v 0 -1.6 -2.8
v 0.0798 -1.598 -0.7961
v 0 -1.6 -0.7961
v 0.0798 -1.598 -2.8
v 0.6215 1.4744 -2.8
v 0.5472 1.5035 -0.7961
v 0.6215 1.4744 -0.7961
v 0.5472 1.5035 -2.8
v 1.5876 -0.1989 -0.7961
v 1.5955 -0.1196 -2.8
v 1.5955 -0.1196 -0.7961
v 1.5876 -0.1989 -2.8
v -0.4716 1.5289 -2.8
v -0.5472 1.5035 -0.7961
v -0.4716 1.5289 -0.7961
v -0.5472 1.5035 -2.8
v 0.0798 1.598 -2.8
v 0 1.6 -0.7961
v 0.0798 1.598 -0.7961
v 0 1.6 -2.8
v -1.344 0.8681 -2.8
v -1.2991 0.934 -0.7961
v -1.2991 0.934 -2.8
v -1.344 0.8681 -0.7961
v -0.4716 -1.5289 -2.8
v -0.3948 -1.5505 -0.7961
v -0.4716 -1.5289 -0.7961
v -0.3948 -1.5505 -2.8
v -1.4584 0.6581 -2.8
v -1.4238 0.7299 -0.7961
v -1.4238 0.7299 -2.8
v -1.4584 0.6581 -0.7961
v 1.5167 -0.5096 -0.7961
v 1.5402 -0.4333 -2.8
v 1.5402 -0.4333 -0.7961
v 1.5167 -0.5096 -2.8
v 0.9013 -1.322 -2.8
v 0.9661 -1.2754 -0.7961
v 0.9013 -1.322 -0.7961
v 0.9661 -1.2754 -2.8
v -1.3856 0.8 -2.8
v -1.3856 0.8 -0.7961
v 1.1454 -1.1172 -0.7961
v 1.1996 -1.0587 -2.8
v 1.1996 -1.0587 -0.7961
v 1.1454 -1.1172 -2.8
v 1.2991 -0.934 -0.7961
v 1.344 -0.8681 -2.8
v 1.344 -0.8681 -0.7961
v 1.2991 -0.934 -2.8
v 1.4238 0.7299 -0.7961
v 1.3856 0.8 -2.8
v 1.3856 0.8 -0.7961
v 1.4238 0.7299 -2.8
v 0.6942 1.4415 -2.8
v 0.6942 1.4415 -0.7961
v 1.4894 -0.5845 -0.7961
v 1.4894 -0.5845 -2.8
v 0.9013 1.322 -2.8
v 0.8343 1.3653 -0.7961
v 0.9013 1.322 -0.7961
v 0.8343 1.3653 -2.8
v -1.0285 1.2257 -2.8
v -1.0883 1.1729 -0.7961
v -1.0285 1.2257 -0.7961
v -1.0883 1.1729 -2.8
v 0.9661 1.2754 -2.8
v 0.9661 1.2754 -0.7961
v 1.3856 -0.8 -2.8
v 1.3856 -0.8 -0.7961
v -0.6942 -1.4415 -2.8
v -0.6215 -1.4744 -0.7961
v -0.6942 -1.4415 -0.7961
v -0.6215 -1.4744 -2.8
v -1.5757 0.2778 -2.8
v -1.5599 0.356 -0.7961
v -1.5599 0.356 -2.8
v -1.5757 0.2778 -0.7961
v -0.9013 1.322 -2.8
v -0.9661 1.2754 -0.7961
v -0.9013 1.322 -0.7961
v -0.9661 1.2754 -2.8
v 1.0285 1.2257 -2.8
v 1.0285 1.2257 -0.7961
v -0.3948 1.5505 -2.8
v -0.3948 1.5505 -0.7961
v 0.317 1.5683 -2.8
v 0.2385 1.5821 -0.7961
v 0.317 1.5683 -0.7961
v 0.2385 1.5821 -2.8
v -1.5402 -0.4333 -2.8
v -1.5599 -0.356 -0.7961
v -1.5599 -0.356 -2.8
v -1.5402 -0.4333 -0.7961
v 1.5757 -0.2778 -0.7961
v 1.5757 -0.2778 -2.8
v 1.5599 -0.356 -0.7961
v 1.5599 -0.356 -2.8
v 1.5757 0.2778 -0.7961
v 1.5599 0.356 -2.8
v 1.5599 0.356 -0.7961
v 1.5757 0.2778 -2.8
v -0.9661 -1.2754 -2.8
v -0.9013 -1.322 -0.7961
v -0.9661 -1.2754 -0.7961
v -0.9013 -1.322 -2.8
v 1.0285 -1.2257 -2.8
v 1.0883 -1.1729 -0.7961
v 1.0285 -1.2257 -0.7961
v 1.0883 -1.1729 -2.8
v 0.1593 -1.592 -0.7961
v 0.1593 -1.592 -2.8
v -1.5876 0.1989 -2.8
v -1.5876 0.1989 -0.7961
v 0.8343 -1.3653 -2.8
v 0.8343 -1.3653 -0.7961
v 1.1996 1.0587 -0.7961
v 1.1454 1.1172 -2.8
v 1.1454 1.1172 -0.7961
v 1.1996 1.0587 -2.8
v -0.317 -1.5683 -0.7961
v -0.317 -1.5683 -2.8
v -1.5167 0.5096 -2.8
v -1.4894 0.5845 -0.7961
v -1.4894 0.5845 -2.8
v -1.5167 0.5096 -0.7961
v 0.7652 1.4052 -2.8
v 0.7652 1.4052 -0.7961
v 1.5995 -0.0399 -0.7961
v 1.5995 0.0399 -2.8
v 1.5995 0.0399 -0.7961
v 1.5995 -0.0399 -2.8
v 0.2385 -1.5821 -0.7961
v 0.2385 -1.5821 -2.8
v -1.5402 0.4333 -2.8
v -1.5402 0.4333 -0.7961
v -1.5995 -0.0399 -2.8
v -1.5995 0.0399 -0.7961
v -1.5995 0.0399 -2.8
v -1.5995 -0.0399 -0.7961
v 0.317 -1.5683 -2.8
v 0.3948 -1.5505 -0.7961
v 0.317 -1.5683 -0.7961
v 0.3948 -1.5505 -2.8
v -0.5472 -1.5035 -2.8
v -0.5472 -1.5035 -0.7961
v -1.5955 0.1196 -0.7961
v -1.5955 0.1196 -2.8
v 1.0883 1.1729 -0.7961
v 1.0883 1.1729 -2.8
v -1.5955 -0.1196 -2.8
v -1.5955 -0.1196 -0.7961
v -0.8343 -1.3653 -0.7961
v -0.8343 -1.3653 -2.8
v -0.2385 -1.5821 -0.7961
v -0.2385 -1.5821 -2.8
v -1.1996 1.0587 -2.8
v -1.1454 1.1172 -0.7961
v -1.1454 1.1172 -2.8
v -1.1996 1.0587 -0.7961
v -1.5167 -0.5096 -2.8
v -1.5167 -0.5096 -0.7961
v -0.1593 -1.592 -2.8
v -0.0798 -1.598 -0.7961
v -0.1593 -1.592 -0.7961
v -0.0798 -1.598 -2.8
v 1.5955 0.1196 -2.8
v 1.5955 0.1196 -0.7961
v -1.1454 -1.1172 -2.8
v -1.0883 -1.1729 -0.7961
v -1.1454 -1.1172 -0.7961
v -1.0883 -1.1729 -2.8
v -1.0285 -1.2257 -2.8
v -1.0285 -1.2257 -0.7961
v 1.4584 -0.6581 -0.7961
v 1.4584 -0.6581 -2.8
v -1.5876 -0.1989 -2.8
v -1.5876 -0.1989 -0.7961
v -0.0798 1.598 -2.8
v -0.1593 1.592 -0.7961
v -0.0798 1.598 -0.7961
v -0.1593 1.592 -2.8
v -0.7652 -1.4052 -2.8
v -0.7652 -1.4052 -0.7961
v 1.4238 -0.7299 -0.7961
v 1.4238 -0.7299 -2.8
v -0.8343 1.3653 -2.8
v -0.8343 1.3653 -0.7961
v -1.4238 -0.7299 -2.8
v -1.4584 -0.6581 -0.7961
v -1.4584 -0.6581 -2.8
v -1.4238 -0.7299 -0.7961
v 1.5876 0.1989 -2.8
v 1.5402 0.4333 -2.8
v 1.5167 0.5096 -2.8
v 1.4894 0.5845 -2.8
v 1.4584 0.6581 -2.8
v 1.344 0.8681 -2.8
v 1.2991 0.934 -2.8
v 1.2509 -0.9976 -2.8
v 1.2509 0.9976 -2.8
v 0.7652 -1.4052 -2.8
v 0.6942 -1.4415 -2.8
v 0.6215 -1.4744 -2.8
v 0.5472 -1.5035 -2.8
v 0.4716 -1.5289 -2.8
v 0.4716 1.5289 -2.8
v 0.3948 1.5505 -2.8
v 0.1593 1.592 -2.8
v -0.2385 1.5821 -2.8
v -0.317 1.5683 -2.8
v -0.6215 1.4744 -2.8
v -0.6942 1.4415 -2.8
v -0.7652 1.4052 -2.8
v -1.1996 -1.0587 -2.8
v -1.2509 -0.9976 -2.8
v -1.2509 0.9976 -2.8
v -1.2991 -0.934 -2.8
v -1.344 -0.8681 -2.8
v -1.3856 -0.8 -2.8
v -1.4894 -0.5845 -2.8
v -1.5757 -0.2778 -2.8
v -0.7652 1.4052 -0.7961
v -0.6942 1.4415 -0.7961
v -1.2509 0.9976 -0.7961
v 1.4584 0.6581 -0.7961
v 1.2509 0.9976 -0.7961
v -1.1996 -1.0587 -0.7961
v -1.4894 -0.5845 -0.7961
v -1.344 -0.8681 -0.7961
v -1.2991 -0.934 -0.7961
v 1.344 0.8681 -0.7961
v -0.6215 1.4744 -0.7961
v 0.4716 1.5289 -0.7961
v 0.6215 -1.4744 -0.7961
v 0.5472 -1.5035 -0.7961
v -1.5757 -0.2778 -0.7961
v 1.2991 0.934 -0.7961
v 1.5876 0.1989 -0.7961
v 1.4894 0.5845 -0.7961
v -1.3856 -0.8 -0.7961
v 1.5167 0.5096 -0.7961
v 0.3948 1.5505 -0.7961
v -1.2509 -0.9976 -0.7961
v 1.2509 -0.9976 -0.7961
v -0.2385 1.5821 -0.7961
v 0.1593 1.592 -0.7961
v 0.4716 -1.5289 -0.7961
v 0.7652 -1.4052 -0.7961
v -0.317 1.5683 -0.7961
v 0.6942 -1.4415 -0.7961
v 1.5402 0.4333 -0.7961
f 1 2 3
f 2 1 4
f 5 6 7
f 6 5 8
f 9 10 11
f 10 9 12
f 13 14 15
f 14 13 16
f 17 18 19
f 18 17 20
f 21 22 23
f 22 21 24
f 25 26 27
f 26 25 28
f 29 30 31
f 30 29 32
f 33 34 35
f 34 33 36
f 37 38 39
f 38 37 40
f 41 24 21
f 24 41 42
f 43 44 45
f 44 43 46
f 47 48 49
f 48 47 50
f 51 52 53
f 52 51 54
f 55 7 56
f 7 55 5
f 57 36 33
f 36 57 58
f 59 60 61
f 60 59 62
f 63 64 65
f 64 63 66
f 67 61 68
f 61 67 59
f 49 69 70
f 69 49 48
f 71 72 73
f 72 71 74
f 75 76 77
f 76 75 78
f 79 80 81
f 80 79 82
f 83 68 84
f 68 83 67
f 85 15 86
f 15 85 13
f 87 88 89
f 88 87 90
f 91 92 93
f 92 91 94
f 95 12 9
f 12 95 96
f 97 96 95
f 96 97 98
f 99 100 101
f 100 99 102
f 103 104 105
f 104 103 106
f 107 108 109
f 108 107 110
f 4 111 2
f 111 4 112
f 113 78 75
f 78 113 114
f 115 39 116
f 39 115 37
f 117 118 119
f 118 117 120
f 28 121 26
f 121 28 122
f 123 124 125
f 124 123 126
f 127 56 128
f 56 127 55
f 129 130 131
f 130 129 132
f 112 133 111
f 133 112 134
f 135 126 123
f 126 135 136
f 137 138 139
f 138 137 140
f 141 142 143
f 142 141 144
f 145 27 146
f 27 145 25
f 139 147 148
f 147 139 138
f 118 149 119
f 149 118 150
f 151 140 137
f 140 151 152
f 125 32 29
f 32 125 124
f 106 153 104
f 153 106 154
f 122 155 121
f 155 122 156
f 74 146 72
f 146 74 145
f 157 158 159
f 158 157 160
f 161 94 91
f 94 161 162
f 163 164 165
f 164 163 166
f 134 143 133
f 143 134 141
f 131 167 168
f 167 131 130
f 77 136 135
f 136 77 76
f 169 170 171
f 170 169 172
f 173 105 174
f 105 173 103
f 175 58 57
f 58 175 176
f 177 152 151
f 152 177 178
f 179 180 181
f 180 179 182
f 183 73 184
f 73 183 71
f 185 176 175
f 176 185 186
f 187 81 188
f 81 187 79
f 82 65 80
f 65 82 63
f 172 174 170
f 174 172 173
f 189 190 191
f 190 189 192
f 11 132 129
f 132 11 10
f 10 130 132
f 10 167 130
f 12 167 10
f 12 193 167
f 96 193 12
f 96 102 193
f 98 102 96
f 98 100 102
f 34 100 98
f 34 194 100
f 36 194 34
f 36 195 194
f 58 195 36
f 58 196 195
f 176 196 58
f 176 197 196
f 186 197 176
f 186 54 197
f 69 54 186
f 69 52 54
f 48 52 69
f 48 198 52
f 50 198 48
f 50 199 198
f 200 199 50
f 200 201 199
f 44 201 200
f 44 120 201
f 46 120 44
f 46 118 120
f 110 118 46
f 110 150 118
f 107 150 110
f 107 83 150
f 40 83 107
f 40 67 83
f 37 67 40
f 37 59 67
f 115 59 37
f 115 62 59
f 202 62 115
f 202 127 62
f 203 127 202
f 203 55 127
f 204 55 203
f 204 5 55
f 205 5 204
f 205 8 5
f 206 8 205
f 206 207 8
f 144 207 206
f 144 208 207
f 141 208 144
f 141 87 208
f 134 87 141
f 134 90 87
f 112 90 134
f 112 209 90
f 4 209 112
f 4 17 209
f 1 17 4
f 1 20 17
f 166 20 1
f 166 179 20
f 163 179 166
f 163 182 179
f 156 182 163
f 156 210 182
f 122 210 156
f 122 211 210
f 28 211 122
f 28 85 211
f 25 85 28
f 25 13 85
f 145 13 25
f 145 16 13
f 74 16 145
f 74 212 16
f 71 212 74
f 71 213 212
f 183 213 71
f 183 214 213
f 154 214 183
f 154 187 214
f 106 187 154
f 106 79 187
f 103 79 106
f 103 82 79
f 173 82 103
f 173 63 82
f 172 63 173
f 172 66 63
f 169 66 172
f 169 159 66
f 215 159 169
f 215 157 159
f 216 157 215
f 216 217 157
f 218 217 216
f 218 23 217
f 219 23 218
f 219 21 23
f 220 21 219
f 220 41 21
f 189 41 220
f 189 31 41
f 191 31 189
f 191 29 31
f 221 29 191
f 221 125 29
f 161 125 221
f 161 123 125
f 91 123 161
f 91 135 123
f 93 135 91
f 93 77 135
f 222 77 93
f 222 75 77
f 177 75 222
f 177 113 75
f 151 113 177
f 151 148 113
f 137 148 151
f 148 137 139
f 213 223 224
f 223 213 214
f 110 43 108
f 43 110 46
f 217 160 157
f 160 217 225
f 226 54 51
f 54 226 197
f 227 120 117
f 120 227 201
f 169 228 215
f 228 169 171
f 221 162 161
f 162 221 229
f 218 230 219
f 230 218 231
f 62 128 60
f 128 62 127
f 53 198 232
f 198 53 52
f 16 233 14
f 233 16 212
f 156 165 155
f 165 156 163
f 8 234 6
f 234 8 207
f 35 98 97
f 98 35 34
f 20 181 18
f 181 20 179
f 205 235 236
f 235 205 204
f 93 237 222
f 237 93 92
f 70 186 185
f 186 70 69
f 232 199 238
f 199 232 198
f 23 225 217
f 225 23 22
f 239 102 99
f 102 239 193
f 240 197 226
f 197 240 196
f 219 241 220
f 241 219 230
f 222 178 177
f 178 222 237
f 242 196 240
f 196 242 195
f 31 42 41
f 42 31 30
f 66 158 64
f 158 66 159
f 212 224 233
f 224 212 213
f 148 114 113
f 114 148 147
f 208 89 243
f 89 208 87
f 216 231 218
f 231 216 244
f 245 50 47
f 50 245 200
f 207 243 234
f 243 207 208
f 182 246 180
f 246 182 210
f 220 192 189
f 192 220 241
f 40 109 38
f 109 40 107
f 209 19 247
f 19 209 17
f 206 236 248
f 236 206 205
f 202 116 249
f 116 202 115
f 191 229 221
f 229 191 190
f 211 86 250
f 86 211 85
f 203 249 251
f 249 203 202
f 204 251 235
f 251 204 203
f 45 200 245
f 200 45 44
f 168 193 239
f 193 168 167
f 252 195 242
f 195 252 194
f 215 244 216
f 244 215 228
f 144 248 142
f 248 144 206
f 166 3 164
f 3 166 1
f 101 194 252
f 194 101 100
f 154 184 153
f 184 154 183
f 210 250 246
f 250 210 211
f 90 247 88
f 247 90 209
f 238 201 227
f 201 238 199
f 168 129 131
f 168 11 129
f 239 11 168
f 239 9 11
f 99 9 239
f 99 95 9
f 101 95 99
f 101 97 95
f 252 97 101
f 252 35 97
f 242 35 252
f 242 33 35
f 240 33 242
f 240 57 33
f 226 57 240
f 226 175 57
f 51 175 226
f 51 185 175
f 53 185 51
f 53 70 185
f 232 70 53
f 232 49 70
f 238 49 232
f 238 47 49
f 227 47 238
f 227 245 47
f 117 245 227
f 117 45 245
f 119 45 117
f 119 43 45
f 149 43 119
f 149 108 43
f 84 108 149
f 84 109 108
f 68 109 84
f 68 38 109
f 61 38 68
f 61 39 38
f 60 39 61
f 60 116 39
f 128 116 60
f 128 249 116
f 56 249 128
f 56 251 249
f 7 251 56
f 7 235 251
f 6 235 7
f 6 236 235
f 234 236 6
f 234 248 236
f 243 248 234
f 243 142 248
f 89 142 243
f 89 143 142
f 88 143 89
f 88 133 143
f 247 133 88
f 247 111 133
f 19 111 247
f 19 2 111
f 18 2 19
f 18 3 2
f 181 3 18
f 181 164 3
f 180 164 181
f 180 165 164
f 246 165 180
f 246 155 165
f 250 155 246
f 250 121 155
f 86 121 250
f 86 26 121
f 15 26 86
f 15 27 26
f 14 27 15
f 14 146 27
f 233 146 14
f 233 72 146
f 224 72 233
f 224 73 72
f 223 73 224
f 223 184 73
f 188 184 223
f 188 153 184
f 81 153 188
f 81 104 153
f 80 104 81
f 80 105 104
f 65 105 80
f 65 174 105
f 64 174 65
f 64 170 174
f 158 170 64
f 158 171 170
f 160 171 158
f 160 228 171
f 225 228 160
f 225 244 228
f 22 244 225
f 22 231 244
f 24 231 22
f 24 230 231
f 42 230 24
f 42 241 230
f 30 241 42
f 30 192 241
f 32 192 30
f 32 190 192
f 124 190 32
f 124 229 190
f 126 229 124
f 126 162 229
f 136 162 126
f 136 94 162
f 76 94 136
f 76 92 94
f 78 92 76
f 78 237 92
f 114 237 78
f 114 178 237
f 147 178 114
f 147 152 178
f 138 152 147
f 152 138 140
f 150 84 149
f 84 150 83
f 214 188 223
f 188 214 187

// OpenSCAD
use <../lib.scad>
use <3570.scad>
$fa=1; $fs=0.2;
function ldraw_lib__739(realsolid=false) = [
// 0 ~Moved to 3570
// 0 Name: 739.dat
// 0 Author: [PTadmin]
// 0 !LDRAW_ORG Part UPDATE 2010-02
// 0 !LICENSE Licensed under CC BY 4.0 : see CAreadme.txt
// 
// 0 BFC CERTIFY CCW
  [0,"BFC","CERTIFY"],
  [0,"BFC","CCW"],
// 
// 0 !HISTORY 2010-07-05 [PTadmin] Official Update 2010-02
// 
// 
// 0 // Roadsign Octagonal
// 1 16 0 0 0 1 0 0 0 1 0 0 0 1 3570.dat
  [1,16,0,0,0,1,0,0,0,1,0,0,0,1, ldraw_lib__3570(realsolid)],
];
module ldraw_lib__739(step=0, col=false, unit=2/5, alt=false, line=0.2, solid=!$preview)
    makepoly(ldraw_lib__739(solid), step=step, col=col, unit=unit, alt=alt, line=line, solid=solid);
ldraw_lib__739(line=0.2);
